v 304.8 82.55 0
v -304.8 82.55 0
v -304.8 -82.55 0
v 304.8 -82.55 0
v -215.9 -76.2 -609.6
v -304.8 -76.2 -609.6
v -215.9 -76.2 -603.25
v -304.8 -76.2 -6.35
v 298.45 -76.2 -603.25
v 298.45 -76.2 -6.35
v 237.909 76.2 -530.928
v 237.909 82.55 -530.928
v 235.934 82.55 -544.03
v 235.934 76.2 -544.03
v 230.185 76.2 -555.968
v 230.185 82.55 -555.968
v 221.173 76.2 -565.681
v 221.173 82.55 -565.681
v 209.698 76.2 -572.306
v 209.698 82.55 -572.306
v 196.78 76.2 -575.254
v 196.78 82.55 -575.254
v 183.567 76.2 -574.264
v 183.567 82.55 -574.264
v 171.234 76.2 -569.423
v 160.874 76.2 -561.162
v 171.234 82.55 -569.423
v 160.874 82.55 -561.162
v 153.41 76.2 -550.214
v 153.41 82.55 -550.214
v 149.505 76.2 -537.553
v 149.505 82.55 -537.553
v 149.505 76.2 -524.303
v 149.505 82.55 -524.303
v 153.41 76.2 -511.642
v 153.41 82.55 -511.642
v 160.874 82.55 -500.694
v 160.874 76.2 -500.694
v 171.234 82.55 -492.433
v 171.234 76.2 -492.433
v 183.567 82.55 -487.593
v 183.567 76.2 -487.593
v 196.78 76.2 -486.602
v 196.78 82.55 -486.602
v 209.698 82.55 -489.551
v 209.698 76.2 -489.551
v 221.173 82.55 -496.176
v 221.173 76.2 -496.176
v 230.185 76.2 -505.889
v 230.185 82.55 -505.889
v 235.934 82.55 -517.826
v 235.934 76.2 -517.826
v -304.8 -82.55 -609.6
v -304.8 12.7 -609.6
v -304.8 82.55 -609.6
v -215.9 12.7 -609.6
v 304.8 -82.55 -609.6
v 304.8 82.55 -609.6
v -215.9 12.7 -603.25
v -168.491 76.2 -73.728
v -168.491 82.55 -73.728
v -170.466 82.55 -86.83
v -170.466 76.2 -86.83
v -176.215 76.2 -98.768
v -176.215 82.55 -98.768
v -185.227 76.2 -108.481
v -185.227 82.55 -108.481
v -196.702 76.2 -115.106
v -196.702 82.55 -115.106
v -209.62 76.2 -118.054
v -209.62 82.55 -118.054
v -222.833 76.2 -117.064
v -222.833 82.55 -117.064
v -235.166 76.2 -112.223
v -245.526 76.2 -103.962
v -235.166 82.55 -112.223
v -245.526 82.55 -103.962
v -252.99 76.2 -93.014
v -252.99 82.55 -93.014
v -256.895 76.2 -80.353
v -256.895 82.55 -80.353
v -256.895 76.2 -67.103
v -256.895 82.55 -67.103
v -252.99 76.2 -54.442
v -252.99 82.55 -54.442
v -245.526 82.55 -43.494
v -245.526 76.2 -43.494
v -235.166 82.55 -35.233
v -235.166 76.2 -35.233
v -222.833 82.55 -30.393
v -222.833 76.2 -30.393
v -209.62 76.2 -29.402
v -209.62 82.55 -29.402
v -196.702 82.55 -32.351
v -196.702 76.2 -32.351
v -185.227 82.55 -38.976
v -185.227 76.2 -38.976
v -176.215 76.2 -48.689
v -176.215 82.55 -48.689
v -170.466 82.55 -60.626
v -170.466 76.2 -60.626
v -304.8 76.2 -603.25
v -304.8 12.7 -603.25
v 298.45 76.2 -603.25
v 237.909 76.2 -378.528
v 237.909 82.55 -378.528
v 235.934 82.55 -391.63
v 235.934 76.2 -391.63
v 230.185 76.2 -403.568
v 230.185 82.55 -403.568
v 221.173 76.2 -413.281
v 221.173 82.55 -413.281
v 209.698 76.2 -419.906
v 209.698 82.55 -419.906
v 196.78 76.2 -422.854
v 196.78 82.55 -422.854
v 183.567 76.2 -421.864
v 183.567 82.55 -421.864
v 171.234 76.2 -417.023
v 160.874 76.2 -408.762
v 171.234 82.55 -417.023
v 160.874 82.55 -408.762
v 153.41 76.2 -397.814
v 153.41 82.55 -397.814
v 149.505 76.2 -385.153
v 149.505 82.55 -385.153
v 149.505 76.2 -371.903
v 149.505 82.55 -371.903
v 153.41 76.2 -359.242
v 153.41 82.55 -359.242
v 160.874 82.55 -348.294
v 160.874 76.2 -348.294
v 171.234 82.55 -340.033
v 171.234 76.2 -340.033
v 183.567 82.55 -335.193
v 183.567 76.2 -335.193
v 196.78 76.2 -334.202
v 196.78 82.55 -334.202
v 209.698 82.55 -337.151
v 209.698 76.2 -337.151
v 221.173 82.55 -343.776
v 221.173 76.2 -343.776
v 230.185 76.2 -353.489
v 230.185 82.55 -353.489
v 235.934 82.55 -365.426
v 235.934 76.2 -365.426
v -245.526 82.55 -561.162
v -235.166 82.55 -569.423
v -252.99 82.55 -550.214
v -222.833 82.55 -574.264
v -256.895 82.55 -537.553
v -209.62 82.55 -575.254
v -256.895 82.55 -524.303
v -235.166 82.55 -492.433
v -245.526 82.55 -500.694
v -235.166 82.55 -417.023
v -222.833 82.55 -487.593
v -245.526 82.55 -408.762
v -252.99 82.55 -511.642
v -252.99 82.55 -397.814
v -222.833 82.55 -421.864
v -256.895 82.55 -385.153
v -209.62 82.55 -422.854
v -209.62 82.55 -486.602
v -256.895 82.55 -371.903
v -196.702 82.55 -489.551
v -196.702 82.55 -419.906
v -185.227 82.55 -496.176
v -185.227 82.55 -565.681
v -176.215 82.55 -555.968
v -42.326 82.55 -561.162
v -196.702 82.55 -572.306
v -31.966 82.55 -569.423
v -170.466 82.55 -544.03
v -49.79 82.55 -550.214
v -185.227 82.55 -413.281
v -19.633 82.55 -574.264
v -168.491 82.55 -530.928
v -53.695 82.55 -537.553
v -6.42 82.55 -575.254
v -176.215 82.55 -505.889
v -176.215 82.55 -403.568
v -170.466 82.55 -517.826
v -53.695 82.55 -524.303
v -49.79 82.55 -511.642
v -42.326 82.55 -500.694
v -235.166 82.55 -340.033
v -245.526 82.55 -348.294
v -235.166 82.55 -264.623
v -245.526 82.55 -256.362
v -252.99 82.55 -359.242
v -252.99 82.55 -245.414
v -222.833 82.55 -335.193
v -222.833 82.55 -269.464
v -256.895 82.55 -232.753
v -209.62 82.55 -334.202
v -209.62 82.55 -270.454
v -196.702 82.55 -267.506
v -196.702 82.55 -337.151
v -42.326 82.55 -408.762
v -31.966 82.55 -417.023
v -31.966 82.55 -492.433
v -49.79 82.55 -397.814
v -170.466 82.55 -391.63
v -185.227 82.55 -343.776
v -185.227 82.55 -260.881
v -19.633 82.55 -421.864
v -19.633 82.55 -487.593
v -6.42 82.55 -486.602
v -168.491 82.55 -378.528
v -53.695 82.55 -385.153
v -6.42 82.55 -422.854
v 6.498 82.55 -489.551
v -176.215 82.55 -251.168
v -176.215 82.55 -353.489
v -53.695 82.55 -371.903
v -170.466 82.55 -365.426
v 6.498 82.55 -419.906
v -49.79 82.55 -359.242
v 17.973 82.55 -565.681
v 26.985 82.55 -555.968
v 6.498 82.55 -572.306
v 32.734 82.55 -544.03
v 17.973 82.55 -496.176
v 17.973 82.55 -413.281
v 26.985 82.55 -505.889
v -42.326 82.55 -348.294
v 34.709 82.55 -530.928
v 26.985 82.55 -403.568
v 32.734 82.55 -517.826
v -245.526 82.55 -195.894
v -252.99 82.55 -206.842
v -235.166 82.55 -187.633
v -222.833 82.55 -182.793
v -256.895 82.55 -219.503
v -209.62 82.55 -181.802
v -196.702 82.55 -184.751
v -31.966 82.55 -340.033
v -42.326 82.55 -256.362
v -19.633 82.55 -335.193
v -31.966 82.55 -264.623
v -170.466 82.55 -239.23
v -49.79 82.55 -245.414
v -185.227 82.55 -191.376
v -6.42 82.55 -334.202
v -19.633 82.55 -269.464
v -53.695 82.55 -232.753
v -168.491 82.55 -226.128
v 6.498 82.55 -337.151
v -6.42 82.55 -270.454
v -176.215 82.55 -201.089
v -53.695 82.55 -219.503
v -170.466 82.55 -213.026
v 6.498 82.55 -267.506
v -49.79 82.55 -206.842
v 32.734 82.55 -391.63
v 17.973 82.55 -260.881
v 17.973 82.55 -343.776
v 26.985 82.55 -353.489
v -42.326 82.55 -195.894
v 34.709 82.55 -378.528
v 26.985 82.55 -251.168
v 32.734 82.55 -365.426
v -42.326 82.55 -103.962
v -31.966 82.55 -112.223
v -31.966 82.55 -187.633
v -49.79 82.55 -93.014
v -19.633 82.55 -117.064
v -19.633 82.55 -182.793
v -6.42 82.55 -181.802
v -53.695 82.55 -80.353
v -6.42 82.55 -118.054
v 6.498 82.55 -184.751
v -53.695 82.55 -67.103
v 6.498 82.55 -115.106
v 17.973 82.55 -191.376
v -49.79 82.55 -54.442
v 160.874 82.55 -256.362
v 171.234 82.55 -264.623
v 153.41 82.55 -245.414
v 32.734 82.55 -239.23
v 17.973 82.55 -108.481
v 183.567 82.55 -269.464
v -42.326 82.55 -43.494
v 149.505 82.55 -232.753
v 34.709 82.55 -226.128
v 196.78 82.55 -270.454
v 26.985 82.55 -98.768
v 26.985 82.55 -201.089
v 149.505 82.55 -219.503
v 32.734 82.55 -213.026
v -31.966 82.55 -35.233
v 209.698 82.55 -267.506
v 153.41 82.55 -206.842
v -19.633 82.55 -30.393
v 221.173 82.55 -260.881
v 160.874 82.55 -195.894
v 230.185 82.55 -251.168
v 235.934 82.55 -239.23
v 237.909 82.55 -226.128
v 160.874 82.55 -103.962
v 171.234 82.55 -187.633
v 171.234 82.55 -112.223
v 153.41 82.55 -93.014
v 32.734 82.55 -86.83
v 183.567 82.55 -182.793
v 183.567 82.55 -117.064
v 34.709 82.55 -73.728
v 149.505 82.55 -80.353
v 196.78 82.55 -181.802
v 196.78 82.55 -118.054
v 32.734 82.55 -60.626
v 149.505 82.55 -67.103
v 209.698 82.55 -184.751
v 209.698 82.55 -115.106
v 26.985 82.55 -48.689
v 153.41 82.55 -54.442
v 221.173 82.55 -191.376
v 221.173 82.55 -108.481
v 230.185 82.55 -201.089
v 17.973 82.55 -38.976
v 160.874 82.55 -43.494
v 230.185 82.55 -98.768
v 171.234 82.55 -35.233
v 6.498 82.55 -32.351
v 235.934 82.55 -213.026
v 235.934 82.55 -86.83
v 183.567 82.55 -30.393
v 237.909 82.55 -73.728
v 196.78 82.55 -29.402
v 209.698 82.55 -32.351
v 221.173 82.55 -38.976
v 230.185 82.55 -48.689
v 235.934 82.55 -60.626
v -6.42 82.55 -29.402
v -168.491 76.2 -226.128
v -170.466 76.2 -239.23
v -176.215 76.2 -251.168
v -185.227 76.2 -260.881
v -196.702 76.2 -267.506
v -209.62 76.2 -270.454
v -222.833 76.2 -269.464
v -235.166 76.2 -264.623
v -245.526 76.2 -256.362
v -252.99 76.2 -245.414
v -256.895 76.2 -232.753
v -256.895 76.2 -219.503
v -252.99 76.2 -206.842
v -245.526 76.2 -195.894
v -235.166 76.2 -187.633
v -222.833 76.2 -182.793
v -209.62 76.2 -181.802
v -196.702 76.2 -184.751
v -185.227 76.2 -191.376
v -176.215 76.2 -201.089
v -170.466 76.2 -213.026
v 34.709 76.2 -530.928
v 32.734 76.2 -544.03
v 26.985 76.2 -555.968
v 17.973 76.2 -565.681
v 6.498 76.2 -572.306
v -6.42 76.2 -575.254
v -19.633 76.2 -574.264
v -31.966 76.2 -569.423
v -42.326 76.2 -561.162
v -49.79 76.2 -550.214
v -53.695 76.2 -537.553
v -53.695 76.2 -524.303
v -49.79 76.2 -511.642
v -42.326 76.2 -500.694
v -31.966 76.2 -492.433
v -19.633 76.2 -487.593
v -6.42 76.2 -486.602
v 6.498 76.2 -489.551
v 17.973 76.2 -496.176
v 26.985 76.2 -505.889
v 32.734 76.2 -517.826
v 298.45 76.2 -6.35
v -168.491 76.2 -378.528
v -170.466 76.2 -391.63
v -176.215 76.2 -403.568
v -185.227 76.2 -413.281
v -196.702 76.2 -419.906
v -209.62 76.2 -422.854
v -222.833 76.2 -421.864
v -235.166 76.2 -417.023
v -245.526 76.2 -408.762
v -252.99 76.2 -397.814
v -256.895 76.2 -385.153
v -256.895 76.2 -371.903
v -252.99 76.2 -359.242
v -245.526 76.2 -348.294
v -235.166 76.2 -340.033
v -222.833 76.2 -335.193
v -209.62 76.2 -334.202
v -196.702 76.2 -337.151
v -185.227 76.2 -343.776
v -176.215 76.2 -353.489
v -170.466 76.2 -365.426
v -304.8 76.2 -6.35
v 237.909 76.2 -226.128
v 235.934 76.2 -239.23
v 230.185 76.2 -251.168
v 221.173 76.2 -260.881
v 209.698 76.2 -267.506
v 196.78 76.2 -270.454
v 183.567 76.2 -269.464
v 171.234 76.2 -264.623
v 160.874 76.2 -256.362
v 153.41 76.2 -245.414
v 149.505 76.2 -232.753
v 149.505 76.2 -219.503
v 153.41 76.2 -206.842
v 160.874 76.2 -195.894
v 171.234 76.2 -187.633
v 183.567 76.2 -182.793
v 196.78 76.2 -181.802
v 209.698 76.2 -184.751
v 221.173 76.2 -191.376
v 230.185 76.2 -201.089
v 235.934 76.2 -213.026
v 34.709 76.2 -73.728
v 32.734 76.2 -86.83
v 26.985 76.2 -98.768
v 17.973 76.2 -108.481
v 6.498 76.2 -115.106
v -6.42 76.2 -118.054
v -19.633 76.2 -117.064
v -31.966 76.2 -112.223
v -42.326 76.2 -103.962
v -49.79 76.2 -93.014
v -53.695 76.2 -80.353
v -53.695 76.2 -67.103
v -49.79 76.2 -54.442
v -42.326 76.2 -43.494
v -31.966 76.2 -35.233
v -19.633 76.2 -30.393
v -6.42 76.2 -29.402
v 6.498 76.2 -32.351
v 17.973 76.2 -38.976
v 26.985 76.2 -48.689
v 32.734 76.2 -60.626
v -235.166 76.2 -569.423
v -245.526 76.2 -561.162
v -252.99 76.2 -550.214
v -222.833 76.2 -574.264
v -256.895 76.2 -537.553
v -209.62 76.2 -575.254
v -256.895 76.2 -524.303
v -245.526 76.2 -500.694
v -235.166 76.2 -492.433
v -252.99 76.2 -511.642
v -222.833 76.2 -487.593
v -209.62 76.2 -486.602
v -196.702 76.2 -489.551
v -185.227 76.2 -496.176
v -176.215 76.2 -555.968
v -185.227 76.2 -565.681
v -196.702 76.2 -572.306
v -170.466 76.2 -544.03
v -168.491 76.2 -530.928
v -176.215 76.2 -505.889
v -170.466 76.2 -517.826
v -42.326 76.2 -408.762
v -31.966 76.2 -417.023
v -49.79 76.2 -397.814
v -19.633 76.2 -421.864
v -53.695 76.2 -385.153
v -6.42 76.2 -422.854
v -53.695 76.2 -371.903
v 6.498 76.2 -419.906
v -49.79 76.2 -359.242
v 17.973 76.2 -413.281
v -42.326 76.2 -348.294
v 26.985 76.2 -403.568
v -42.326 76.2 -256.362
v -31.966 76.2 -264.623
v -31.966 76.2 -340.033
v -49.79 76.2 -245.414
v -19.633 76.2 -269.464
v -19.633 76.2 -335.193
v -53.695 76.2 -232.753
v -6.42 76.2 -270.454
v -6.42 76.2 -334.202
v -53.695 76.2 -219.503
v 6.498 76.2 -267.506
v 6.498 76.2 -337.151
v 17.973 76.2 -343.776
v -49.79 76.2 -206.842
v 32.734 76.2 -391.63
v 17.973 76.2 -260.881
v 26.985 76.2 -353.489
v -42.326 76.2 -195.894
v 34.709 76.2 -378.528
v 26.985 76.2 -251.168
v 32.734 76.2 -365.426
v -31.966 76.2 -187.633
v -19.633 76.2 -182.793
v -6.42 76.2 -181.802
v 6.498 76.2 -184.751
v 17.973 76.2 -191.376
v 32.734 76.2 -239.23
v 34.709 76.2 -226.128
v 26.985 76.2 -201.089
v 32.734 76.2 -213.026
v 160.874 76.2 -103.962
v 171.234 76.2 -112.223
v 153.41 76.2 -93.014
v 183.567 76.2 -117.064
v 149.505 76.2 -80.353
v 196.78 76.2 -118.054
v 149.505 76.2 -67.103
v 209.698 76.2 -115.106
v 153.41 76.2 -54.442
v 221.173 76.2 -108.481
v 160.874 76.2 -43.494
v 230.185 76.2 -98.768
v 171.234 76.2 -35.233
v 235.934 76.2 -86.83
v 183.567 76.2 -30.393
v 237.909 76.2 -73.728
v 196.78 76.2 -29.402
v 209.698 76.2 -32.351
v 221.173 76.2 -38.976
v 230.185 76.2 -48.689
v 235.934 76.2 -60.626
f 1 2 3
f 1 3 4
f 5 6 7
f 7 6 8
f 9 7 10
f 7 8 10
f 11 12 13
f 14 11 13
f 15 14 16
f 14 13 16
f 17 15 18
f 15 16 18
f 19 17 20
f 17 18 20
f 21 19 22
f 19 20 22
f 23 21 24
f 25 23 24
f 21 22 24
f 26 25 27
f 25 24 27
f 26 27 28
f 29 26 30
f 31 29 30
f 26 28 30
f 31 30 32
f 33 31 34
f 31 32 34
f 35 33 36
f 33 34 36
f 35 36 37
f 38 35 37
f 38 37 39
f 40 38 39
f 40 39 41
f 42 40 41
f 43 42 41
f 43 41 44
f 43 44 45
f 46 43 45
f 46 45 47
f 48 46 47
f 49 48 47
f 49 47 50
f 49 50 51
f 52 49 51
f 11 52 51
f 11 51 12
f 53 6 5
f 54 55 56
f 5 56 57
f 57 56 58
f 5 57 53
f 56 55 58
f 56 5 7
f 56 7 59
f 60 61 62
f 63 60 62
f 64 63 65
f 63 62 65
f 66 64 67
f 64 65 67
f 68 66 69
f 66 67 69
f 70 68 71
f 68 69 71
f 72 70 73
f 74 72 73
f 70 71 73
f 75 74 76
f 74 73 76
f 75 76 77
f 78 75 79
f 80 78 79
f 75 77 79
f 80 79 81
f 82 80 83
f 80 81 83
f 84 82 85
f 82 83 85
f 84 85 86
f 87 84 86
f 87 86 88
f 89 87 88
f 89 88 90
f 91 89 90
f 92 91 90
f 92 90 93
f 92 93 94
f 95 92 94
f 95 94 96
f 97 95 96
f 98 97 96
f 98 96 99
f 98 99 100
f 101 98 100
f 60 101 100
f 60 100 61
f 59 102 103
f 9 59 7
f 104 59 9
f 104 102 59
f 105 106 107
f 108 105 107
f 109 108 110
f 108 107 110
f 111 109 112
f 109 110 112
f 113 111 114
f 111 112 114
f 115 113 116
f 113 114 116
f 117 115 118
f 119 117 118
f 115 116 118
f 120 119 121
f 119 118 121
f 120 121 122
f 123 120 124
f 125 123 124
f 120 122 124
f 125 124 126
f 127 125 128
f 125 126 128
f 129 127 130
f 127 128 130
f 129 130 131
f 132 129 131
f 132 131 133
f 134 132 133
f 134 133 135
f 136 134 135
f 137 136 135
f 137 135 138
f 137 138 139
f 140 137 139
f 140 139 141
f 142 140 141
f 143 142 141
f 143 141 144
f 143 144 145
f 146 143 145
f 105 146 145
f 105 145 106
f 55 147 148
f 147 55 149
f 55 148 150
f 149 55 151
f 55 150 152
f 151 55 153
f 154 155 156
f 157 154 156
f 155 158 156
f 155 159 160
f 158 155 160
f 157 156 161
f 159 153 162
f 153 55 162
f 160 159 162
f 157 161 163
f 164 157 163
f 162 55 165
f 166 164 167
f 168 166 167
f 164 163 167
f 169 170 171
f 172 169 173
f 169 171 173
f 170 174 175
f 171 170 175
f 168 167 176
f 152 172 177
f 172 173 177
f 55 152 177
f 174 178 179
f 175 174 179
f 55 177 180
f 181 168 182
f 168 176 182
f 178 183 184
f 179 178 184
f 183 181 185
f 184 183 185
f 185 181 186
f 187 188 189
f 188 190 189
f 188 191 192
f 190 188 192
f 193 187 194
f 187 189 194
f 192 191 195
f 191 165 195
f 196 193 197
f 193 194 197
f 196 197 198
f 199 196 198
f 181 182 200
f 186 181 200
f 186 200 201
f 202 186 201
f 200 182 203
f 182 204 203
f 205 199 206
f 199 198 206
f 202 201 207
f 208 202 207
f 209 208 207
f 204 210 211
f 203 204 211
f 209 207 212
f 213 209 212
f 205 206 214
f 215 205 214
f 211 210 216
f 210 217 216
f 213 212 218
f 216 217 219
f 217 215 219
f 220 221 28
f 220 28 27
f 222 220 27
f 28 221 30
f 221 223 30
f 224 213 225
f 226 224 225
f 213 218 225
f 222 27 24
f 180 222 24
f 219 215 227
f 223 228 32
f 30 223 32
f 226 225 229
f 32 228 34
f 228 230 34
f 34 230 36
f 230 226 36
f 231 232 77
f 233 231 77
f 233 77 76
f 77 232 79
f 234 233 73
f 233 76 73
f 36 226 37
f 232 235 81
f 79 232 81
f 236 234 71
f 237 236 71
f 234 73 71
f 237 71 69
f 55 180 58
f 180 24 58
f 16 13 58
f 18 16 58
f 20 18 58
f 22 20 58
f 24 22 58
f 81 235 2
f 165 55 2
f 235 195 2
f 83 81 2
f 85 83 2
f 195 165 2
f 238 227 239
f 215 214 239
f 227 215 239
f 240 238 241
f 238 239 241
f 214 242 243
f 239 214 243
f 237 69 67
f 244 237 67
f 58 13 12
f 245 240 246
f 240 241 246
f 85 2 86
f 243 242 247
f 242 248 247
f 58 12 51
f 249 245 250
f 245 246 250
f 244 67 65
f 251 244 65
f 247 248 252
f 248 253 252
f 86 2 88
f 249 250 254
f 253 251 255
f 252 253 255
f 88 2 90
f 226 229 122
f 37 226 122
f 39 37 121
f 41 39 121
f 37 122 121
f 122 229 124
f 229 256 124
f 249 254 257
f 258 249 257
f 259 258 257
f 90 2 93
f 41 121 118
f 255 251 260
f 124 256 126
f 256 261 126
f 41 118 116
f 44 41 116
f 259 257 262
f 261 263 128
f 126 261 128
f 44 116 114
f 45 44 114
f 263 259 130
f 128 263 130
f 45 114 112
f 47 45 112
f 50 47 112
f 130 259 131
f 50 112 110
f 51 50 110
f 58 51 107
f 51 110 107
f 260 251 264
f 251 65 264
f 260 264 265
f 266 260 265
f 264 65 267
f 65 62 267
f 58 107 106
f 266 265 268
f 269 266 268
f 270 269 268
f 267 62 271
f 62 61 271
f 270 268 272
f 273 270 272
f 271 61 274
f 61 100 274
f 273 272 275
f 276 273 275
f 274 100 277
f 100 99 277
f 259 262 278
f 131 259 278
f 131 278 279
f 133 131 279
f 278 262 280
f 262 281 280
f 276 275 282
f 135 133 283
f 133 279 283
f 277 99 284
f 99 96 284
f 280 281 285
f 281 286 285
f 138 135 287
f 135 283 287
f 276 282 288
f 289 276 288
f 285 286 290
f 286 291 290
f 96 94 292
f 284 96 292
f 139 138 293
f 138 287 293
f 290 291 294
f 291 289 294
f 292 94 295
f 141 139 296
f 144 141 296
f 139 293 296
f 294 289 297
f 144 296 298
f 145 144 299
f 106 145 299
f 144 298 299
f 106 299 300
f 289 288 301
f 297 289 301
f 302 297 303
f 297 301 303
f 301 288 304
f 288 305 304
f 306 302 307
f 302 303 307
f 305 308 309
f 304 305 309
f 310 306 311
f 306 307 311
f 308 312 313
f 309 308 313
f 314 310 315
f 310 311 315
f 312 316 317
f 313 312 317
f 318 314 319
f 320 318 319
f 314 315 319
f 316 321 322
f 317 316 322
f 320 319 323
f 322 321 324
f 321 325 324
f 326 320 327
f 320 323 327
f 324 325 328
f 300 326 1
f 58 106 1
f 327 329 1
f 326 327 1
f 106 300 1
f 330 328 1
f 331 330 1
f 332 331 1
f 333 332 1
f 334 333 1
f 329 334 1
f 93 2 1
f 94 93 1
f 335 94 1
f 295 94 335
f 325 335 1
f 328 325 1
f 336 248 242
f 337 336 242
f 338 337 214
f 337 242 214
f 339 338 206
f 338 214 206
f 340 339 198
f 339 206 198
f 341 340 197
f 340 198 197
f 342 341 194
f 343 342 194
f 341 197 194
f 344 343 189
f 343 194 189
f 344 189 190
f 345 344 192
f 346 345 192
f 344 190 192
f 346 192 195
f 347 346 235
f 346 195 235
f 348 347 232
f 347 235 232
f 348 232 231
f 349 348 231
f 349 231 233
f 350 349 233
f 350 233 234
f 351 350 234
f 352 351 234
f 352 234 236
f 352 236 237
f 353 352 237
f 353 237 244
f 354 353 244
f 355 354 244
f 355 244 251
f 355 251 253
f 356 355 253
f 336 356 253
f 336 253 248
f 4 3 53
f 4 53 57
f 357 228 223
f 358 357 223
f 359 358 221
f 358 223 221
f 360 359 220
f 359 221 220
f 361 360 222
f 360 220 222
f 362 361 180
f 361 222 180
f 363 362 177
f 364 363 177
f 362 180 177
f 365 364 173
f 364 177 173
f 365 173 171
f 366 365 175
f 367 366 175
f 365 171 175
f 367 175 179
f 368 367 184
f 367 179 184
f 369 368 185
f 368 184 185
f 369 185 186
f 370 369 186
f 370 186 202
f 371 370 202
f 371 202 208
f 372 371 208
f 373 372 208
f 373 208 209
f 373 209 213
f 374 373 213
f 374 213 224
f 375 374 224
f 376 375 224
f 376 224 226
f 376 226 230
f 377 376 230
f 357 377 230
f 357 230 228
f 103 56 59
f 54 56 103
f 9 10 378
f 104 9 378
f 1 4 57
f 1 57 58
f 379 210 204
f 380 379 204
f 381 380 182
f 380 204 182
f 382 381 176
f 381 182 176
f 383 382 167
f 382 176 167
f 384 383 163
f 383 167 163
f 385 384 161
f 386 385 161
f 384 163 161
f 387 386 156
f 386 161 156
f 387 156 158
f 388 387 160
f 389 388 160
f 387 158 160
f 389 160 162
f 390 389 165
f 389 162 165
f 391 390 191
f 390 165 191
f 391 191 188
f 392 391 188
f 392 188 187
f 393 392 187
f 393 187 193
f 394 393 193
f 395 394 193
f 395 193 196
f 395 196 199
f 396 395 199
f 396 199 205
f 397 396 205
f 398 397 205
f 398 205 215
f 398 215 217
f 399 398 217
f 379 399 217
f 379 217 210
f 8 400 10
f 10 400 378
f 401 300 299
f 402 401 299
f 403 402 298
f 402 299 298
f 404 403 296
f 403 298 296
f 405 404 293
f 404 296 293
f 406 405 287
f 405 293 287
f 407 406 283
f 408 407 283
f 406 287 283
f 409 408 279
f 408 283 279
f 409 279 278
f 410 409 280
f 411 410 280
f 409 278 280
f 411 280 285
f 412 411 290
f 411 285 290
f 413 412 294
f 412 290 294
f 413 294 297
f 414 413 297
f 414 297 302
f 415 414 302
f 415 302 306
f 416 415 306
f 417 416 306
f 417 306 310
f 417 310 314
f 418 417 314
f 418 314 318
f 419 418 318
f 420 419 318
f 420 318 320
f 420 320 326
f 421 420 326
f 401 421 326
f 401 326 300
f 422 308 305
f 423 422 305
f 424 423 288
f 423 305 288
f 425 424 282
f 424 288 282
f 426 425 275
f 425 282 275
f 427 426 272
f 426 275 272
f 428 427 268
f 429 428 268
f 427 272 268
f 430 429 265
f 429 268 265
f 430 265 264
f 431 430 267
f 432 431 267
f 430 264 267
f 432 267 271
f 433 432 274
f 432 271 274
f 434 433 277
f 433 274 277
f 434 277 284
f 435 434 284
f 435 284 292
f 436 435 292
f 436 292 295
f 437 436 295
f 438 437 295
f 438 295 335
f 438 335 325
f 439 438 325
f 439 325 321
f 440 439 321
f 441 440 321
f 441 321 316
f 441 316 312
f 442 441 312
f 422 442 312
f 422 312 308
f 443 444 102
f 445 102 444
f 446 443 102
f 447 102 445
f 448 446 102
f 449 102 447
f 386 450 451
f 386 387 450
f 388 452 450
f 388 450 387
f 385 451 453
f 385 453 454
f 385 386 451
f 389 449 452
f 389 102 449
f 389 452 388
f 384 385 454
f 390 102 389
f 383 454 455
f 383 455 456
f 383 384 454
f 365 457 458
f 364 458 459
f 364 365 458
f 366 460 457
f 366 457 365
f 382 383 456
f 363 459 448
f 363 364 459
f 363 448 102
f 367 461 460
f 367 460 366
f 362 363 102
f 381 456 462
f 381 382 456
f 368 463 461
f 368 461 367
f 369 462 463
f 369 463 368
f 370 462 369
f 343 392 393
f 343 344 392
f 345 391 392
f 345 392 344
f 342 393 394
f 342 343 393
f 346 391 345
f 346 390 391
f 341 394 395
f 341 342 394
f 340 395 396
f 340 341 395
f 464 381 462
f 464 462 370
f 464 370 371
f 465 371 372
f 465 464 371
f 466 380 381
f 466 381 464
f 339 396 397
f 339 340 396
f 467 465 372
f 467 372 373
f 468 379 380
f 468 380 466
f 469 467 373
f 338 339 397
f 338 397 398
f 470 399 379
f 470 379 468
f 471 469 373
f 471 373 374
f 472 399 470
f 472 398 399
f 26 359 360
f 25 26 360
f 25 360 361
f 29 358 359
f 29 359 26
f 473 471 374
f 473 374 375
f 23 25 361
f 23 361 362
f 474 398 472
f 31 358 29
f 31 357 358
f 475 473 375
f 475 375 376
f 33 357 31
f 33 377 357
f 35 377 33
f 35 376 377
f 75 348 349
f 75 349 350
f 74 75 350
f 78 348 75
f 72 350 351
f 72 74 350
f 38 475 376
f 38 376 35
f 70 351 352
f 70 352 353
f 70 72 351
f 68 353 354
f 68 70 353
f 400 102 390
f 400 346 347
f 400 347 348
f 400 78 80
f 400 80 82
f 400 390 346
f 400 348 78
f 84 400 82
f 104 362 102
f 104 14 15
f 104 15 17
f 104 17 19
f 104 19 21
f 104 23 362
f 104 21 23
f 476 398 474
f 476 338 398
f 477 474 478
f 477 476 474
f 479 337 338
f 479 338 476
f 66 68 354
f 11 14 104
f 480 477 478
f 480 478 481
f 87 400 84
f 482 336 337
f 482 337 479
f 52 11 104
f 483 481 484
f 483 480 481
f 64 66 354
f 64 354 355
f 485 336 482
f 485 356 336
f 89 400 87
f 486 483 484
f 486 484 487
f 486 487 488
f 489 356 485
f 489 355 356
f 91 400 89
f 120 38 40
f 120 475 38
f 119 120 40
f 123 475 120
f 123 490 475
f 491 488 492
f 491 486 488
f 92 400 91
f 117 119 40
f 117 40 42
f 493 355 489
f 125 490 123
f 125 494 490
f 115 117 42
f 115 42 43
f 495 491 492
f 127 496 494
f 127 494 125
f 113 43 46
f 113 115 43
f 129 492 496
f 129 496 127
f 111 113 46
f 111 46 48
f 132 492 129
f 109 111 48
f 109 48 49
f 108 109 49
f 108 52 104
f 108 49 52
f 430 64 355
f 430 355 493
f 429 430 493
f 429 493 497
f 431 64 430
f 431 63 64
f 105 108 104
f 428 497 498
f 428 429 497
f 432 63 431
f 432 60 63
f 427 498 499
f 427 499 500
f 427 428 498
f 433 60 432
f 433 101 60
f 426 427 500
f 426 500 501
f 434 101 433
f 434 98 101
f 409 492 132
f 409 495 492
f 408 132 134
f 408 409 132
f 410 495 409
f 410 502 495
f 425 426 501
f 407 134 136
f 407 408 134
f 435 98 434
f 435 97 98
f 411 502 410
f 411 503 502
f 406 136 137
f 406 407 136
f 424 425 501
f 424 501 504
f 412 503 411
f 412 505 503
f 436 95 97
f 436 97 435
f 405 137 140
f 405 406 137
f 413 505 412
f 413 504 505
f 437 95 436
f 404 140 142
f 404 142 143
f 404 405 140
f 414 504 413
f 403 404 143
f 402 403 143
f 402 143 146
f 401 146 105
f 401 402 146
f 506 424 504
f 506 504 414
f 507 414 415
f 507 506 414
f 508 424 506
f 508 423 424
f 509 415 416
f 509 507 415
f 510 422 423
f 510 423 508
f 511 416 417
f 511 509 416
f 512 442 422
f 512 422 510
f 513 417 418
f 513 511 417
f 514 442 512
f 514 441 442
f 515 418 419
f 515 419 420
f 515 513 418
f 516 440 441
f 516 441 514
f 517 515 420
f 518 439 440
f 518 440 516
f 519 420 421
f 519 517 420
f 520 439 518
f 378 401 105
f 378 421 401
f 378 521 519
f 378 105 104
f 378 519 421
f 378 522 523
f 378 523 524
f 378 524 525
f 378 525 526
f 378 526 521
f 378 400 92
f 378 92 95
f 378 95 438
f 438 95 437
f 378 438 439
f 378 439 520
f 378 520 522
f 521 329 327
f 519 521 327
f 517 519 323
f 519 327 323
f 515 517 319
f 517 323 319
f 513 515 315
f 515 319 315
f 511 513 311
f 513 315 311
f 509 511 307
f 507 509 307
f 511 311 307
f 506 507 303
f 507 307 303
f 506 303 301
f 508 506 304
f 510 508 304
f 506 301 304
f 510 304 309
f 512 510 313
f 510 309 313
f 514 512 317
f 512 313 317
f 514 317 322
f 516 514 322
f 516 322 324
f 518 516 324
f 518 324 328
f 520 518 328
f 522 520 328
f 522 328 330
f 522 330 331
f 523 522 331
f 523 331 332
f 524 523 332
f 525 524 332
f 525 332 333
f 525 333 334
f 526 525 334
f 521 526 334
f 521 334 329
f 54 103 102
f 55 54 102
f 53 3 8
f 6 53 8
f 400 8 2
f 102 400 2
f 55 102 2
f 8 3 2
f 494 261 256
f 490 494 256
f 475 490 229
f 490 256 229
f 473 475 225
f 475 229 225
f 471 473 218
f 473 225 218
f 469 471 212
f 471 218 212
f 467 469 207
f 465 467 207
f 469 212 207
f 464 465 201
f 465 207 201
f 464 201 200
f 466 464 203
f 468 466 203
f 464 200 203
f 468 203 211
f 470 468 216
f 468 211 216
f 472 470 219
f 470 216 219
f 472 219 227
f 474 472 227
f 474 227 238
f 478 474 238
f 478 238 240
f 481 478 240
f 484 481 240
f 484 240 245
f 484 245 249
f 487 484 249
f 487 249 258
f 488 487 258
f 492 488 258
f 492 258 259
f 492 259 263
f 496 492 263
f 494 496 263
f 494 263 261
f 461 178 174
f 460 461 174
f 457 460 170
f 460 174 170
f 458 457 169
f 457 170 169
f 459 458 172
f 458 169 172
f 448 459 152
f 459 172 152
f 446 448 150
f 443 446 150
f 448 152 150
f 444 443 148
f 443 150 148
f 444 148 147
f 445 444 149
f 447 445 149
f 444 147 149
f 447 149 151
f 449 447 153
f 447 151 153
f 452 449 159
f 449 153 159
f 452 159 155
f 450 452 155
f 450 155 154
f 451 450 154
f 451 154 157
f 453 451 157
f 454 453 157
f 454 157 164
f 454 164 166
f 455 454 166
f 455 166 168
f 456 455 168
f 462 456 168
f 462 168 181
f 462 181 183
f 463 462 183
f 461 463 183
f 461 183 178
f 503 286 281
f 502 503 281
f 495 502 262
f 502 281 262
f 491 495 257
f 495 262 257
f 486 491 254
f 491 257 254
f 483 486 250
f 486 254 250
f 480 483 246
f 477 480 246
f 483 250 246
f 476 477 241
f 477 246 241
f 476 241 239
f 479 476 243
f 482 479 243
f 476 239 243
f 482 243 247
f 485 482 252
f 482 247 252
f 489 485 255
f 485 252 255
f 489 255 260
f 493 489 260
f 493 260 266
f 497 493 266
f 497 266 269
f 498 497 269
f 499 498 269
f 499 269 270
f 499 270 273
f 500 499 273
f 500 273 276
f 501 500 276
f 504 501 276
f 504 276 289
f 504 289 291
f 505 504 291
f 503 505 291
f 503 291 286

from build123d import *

# Parameters (mm, degrees)
SKETCH1_W           = 609.6
SKETCH1_H           = 165.1
BOSS_EXTRUDE1_DEPTH = 609.6
SHELL1_T            = -6.35
SKETCH2_R           = 44.45
CUT_EXTRUDE2_DEPTH  = 7.62
SKETCH4_W           = 88.9
SKETCH4_H           = 88.9
CUT_EXTRUDE3_DEPTH  = 7.62


with BuildPart() as part:
    # Sketch1 → Boss-Extrude1 (new body)
    with BuildSketch(Plane.XY):
        Rectangle(SKETCH1_W, SKETCH1_H)
    extrude(amount=-BOSS_EXTRUDE1_DEPTH)

    # Shell1
    shell1_openings = [part.faces().sort_by_distance(p)[0] for p in [
        (-304.8, 0, -304.8),
    ]]
    offset(amount=SHELL1_T, openings=shell1_openings, kind=Kind.INTERSECTION)

    # Sketch2 → Cut-Extrude2 (cut)
    with BuildSketch(Plane(origin=(0, 82.55, 0), x_dir=(1, 0, 0), z_dir=(0, 1, 0))):
        with Locations((-212.941456521, 378.528168367)):
            Circle(SKETCH2_R)
        with Locations((-212.941456521, 226.128168367)):
            Circle(SKETCH2_R)
        with Locations((-212.941456521, 73.728168367)):
            Circle(SKETCH2_R)
        with Locations((-9.741456521, 226.128168367)):
            Circle(SKETCH2_R)
        with Locations((-9.741456521, 378.528168367)):
            Circle(SKETCH2_R)
        with Locations((-9.741456521, 73.728168367)):
            Circle(SKETCH2_R)
        with Locations((193.458543479, 226.128168367)):
            Circle(SKETCH2_R)
        with Locations((193.458543479, 378.528168367)):
            Circle(SKETCH2_R)
        with Locations((193.458543479, 73.728168367)):
            Circle(SKETCH2_R)
        with Locations((-212.941456521, 530.928168367)):
            Circle(SKETCH2_R)
        with Locations((-9.741456521, 530.928168367)):
            Circle(SKETCH2_R)
        with Locations((193.458543479, 530.928168367)):
            Circle(SKETCH2_R)
    extrude(amount=-CUT_EXTRUDE2_DEPTH, mode=Mode.SUBTRACT)

    # Sketch4 → Cut-Extrude3 (cut)
    with BuildSketch(Plane(origin=(0, 0, -609.6), x_dir=(-1, 0, 0), z_dir=(0, 0, -1))):
        with Locations((260.35, -31.75)):
            Rectangle(SKETCH4_W, SKETCH4_H)
    extrude(amount=-CUT_EXTRUDE3_DEPTH, mode=Mode.SUBTRACT)


solid = part.part
